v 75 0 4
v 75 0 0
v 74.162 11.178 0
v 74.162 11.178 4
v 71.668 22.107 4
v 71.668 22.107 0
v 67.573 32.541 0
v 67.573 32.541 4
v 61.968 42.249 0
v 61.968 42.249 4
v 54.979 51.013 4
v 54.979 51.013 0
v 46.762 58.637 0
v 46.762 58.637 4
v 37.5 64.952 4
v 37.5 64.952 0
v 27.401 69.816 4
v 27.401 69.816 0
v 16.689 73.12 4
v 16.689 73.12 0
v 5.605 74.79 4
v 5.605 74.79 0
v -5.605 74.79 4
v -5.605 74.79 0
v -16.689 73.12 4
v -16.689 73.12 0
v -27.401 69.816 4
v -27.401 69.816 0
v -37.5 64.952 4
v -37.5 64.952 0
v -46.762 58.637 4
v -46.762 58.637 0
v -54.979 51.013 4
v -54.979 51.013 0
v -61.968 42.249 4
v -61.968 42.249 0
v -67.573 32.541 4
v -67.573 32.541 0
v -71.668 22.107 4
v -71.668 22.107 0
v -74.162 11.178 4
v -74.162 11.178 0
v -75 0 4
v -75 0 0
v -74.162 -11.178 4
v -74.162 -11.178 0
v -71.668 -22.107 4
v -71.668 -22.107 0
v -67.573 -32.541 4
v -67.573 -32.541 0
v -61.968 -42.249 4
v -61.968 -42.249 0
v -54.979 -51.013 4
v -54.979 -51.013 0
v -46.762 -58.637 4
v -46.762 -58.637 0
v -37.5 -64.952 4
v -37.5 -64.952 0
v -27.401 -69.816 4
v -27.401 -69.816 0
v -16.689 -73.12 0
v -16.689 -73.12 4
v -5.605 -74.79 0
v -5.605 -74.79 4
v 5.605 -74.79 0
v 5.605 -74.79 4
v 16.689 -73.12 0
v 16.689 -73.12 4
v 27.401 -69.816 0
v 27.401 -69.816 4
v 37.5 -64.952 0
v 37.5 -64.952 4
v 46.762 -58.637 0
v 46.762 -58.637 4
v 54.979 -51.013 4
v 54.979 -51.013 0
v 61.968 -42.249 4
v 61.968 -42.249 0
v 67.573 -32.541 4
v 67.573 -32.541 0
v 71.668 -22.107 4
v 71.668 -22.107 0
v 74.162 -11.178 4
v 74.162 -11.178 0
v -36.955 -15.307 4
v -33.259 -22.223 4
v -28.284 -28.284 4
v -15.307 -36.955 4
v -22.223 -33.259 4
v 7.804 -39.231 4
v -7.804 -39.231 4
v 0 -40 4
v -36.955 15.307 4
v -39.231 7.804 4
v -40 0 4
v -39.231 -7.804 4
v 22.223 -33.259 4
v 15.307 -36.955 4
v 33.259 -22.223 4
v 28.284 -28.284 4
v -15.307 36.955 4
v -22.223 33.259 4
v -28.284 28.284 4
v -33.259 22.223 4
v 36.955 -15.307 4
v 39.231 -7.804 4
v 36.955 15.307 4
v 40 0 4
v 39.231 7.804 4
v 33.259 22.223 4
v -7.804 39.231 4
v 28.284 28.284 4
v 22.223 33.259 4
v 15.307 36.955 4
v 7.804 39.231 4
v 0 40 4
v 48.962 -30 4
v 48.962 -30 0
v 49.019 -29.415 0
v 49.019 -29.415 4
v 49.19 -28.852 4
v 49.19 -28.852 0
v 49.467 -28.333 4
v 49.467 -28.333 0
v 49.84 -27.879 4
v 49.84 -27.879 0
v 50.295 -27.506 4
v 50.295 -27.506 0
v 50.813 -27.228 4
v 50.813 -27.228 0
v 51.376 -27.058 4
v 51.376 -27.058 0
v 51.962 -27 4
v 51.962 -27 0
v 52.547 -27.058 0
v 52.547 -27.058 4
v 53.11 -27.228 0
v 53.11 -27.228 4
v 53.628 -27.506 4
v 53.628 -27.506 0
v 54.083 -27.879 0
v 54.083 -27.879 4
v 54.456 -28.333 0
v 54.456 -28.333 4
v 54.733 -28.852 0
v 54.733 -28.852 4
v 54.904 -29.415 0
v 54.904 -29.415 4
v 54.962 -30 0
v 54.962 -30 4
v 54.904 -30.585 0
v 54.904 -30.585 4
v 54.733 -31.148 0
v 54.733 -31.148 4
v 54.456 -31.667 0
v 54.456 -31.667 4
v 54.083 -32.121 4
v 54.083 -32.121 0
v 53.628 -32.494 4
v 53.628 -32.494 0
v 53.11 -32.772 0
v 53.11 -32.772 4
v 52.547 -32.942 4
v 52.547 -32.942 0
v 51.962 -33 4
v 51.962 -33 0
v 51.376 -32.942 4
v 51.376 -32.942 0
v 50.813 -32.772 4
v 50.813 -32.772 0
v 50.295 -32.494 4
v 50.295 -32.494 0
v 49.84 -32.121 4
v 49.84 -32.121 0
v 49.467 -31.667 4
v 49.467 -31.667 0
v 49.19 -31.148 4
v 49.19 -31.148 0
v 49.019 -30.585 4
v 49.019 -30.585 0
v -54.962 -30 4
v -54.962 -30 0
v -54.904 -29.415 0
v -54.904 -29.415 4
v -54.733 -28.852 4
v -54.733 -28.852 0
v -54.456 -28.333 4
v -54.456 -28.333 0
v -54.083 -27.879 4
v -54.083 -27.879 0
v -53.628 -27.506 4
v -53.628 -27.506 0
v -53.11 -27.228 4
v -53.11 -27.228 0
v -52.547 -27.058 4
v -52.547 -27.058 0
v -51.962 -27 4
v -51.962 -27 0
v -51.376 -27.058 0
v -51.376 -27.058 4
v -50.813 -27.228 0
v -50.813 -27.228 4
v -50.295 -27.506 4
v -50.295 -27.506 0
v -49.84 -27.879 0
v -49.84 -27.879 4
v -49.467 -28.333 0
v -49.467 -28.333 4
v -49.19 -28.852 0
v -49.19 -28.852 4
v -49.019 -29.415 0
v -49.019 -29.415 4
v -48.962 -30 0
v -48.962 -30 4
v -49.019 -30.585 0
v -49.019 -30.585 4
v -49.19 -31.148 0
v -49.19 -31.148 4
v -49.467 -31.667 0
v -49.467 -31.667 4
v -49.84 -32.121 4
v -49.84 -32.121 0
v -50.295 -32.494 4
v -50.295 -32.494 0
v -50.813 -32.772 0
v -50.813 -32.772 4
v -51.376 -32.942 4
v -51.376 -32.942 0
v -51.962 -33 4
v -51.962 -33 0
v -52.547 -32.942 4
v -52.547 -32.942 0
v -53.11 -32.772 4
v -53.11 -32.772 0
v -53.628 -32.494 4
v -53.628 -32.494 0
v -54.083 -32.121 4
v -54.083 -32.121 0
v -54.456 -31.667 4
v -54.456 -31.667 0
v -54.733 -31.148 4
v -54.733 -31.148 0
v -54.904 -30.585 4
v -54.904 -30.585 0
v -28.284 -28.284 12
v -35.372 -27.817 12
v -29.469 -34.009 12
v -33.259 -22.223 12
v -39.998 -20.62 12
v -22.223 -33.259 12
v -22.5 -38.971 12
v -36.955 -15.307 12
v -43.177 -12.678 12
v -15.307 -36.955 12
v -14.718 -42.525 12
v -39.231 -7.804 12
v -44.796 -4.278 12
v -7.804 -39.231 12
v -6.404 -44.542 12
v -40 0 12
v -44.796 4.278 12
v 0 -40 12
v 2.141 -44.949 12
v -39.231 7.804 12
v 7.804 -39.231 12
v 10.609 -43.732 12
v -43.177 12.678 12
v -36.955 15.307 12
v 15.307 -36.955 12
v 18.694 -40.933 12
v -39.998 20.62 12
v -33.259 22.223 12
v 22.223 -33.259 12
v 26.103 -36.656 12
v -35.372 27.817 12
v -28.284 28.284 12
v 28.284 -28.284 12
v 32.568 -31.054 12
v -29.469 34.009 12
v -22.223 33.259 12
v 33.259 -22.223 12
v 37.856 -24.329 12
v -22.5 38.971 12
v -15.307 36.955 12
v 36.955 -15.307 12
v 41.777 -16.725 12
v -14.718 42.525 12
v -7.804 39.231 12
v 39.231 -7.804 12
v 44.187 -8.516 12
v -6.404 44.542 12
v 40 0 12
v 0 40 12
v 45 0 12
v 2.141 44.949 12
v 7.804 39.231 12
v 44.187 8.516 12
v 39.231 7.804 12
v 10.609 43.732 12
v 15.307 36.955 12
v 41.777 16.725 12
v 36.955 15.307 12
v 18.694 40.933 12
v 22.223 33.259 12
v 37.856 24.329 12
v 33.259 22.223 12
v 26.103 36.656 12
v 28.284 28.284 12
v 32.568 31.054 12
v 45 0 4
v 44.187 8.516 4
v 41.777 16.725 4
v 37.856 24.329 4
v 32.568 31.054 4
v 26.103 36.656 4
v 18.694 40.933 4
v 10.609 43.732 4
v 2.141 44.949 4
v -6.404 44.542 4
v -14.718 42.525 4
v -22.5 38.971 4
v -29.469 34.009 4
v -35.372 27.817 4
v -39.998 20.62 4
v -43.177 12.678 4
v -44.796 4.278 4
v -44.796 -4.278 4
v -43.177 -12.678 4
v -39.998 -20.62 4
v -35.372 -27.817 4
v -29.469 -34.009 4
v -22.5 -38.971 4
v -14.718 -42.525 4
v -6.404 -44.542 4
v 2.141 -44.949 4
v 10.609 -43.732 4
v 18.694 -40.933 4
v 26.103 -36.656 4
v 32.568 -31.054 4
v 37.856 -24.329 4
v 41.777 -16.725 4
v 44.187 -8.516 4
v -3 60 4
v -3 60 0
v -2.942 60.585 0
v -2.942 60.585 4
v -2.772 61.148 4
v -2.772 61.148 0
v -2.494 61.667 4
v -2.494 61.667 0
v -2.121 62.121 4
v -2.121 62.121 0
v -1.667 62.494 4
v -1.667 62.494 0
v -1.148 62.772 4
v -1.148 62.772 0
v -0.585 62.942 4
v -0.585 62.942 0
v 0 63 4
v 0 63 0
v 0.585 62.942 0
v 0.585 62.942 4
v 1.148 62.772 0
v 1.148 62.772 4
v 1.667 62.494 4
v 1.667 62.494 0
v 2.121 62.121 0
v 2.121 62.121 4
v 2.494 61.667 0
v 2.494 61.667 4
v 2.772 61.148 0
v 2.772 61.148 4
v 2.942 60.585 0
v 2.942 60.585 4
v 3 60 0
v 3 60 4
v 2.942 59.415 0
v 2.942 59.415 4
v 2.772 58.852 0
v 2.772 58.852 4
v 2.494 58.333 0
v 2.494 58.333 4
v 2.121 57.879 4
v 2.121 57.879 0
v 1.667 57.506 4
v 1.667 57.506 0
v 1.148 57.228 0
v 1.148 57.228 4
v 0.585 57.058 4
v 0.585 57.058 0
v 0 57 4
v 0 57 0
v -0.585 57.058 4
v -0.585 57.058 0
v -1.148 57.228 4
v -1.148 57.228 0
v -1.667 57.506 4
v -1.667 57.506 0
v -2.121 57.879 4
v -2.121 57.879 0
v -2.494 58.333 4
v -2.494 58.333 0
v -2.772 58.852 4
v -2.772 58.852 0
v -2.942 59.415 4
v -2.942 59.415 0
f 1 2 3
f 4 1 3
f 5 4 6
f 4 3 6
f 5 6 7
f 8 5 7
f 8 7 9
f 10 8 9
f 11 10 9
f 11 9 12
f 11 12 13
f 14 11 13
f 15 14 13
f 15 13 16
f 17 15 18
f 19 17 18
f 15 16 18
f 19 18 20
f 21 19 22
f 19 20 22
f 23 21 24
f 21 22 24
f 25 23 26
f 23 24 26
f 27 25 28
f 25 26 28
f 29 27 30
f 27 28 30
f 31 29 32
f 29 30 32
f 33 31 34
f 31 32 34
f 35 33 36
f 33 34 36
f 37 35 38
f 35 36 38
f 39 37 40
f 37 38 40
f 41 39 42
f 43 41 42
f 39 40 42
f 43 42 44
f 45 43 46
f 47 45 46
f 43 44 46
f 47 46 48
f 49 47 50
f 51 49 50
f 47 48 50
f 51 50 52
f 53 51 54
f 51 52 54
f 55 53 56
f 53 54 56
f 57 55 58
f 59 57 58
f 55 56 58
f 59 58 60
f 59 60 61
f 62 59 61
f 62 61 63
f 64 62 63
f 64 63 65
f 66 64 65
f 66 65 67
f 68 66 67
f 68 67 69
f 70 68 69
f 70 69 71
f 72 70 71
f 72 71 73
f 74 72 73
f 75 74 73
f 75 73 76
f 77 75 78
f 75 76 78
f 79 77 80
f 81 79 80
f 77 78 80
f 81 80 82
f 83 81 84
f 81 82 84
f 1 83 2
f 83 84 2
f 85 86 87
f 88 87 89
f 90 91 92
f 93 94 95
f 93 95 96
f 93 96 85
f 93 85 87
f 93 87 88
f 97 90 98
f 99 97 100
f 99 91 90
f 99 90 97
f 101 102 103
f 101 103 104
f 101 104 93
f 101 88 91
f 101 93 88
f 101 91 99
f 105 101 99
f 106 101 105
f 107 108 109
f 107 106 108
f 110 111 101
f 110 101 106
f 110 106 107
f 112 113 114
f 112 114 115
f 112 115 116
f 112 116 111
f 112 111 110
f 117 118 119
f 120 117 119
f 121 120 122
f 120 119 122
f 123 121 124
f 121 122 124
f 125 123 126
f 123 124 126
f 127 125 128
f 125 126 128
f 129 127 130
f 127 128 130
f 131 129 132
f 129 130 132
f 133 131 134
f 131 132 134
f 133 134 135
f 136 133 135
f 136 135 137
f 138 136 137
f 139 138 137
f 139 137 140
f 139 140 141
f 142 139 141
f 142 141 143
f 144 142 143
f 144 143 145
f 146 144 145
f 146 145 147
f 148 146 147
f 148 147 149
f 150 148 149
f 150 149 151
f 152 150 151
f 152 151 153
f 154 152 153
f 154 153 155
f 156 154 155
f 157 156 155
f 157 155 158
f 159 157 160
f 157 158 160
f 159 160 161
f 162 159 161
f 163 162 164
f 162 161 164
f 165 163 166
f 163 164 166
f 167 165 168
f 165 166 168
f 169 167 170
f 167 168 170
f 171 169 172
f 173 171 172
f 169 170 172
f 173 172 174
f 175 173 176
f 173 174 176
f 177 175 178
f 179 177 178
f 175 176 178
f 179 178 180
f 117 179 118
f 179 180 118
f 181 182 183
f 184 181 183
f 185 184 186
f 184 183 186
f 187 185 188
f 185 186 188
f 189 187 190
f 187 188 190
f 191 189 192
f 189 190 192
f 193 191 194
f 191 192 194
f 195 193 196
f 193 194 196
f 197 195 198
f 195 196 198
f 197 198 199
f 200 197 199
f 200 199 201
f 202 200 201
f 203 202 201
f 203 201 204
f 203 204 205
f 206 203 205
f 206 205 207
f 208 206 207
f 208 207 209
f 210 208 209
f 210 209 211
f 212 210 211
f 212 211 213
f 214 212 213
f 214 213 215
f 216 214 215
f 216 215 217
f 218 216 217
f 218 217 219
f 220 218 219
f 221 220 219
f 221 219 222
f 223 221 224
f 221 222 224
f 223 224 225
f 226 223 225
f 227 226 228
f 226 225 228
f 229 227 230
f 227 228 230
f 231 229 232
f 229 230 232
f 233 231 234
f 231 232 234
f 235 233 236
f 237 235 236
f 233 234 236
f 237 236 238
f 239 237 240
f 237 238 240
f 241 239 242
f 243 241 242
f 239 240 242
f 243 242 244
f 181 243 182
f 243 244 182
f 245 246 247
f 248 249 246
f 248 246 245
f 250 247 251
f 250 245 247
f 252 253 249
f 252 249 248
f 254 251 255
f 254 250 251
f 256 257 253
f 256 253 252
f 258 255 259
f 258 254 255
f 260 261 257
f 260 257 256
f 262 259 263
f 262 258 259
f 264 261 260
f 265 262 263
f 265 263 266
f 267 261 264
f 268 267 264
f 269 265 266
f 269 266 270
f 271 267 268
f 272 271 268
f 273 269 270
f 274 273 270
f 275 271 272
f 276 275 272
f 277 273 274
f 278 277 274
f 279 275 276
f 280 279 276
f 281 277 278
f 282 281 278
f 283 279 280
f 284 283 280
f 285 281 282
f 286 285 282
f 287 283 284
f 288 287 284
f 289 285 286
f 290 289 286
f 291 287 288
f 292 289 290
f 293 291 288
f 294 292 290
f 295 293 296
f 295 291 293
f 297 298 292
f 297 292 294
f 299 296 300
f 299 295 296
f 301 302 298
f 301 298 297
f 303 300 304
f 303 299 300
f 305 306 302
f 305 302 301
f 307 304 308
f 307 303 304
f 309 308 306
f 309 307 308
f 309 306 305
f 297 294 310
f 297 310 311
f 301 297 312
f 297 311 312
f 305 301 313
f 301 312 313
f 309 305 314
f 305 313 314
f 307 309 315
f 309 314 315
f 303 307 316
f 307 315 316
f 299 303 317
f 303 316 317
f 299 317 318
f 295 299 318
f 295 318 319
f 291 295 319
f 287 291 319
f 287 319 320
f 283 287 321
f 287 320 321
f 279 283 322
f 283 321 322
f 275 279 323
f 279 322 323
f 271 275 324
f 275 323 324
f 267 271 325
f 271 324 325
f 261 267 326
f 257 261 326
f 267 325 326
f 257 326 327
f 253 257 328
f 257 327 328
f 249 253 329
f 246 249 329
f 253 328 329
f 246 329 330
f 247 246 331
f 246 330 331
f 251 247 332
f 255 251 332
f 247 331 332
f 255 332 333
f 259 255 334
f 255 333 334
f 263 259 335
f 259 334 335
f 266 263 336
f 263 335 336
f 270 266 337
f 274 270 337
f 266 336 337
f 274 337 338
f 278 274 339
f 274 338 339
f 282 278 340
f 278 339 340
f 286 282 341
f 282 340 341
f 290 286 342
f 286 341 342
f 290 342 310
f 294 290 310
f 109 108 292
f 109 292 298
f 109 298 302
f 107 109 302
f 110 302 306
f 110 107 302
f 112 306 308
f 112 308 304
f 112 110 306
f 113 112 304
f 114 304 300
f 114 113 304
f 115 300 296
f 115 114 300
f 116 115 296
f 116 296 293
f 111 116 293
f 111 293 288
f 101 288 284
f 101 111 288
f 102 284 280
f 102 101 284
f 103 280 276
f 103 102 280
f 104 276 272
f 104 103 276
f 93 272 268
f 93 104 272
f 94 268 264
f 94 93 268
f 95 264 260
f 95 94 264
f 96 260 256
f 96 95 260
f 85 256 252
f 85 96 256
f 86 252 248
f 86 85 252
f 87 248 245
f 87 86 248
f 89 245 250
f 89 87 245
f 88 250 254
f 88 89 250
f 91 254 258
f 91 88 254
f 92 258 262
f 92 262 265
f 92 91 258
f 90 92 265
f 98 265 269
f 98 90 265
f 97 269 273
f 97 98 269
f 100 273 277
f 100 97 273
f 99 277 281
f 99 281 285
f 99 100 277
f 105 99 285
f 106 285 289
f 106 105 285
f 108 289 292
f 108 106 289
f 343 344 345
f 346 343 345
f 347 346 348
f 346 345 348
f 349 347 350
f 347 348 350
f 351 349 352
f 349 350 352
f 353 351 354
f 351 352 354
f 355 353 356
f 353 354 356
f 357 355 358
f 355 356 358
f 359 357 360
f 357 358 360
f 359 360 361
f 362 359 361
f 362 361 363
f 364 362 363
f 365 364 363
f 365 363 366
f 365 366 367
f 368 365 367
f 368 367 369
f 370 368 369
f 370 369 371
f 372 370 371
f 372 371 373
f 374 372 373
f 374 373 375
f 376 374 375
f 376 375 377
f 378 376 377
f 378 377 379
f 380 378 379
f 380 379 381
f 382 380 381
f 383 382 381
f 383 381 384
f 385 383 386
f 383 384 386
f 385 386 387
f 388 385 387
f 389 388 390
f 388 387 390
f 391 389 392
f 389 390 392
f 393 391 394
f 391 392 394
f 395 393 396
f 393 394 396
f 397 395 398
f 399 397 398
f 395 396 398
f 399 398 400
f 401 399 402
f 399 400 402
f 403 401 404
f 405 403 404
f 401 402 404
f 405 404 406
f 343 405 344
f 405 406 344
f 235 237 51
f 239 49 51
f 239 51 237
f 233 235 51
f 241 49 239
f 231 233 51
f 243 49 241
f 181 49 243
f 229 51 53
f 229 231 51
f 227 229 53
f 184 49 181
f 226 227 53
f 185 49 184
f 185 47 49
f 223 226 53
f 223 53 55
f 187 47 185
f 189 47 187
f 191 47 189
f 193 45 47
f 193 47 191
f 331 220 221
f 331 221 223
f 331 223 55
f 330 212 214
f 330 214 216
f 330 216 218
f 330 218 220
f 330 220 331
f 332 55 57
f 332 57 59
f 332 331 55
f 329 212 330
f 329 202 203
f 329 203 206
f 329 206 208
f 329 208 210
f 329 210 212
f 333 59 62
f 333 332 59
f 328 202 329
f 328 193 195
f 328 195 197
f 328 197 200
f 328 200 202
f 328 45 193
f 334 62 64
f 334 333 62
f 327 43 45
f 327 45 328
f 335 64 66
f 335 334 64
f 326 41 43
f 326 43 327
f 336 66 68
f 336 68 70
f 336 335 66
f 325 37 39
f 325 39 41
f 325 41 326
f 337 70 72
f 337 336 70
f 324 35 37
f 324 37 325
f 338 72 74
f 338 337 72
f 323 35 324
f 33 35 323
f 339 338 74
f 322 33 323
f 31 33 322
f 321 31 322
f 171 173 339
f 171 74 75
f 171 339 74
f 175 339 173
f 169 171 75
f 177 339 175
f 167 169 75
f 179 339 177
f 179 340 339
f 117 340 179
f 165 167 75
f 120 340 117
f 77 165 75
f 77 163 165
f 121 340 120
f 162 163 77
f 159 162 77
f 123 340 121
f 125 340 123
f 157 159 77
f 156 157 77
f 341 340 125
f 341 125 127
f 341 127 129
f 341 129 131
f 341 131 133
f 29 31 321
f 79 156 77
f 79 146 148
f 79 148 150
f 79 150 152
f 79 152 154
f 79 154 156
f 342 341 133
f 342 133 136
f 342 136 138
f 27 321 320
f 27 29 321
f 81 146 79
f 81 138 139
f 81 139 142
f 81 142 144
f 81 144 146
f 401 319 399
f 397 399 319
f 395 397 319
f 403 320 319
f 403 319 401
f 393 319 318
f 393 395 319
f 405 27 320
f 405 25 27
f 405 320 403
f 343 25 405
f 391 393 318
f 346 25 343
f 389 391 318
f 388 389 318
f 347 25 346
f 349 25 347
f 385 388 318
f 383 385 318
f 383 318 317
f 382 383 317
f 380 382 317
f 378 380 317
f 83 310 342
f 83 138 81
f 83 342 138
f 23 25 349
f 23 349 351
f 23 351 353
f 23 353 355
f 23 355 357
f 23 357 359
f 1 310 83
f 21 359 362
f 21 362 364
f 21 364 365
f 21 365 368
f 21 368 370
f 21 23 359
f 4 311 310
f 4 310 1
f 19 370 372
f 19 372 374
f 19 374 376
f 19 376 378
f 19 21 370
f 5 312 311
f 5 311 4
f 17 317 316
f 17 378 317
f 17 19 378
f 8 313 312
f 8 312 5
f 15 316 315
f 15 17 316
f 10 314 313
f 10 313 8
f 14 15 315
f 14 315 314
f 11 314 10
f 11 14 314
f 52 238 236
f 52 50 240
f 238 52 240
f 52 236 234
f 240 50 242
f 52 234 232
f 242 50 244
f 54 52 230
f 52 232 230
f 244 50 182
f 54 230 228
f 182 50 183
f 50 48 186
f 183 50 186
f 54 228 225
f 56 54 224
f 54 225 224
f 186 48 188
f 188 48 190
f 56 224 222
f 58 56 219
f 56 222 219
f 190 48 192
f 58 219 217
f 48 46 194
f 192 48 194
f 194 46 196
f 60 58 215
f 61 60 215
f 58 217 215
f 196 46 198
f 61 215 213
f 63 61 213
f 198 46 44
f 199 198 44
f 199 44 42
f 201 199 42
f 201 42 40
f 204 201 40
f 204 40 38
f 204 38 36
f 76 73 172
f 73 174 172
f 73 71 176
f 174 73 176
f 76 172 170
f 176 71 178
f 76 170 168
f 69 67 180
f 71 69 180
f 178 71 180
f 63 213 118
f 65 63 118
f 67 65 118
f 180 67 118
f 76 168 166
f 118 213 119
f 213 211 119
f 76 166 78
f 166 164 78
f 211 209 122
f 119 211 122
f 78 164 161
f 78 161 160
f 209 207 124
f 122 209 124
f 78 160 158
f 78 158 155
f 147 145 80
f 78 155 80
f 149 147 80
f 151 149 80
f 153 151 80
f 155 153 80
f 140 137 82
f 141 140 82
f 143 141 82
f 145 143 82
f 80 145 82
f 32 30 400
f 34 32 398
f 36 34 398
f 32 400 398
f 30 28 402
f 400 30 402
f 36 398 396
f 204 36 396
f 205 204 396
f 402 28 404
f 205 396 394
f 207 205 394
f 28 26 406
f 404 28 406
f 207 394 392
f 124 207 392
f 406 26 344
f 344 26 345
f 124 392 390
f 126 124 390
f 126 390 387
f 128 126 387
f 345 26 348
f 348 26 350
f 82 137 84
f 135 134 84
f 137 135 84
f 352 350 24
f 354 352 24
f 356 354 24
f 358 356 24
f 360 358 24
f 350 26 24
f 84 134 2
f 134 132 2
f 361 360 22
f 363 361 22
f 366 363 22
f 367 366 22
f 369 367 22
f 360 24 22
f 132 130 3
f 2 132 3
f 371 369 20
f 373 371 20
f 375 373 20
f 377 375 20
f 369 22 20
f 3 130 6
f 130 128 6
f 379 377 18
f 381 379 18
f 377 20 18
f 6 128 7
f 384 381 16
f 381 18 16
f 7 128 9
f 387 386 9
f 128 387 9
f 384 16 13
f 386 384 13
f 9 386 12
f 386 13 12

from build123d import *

# Parameters (mm, degrees)
SKETCH1_R           = 75
BOSS_EXTRUDE1_DEPTH = 4
SKETCH2_R           = 45
SKETCH2_R_2         = 40
BOSS_EXTRUDE2_DEPTH = 8
SKETCH4_R           = 3
CUT_EXTRUDE1_DEPTH  = 13


with BuildPart() as part:
    # Sketch1 → Boss-Extrude1 (new body)
    with BuildSketch(Plane.XY):
        Circle(SKETCH1_R)
    extrude(amount=BOSS_EXTRUDE1_DEPTH)

    # Sketch2 → Boss-Extrude2 (add)
    with BuildSketch(Plane.XY.offset(4)):
        Circle(SKETCH2_R)
        Circle(SKETCH2_R_2, mode=Mode.SUBTRACT)
    extrude(amount=BOSS_EXTRUDE2_DEPTH)

    # Sketch4 → Cut-Extrude1 (cut, through all)
    with BuildSketch(Plane(origin=(0, 0, 0), x_dir=(-1, 0, 0), z_dir=(0, 0, -1))):
        with Locations((0, 60)):
            Circle(SKETCH4_R)
        with Locations((51.961524227, -30)):
            Circle(SKETCH4_R)
        with Locations((-51.961524227, -30)):
            Circle(SKETCH4_R)
    extrude(amount=-CUT_EXTRUDE1_DEPTH, mode=Mode.SUBTRACT)


solid = part.part
